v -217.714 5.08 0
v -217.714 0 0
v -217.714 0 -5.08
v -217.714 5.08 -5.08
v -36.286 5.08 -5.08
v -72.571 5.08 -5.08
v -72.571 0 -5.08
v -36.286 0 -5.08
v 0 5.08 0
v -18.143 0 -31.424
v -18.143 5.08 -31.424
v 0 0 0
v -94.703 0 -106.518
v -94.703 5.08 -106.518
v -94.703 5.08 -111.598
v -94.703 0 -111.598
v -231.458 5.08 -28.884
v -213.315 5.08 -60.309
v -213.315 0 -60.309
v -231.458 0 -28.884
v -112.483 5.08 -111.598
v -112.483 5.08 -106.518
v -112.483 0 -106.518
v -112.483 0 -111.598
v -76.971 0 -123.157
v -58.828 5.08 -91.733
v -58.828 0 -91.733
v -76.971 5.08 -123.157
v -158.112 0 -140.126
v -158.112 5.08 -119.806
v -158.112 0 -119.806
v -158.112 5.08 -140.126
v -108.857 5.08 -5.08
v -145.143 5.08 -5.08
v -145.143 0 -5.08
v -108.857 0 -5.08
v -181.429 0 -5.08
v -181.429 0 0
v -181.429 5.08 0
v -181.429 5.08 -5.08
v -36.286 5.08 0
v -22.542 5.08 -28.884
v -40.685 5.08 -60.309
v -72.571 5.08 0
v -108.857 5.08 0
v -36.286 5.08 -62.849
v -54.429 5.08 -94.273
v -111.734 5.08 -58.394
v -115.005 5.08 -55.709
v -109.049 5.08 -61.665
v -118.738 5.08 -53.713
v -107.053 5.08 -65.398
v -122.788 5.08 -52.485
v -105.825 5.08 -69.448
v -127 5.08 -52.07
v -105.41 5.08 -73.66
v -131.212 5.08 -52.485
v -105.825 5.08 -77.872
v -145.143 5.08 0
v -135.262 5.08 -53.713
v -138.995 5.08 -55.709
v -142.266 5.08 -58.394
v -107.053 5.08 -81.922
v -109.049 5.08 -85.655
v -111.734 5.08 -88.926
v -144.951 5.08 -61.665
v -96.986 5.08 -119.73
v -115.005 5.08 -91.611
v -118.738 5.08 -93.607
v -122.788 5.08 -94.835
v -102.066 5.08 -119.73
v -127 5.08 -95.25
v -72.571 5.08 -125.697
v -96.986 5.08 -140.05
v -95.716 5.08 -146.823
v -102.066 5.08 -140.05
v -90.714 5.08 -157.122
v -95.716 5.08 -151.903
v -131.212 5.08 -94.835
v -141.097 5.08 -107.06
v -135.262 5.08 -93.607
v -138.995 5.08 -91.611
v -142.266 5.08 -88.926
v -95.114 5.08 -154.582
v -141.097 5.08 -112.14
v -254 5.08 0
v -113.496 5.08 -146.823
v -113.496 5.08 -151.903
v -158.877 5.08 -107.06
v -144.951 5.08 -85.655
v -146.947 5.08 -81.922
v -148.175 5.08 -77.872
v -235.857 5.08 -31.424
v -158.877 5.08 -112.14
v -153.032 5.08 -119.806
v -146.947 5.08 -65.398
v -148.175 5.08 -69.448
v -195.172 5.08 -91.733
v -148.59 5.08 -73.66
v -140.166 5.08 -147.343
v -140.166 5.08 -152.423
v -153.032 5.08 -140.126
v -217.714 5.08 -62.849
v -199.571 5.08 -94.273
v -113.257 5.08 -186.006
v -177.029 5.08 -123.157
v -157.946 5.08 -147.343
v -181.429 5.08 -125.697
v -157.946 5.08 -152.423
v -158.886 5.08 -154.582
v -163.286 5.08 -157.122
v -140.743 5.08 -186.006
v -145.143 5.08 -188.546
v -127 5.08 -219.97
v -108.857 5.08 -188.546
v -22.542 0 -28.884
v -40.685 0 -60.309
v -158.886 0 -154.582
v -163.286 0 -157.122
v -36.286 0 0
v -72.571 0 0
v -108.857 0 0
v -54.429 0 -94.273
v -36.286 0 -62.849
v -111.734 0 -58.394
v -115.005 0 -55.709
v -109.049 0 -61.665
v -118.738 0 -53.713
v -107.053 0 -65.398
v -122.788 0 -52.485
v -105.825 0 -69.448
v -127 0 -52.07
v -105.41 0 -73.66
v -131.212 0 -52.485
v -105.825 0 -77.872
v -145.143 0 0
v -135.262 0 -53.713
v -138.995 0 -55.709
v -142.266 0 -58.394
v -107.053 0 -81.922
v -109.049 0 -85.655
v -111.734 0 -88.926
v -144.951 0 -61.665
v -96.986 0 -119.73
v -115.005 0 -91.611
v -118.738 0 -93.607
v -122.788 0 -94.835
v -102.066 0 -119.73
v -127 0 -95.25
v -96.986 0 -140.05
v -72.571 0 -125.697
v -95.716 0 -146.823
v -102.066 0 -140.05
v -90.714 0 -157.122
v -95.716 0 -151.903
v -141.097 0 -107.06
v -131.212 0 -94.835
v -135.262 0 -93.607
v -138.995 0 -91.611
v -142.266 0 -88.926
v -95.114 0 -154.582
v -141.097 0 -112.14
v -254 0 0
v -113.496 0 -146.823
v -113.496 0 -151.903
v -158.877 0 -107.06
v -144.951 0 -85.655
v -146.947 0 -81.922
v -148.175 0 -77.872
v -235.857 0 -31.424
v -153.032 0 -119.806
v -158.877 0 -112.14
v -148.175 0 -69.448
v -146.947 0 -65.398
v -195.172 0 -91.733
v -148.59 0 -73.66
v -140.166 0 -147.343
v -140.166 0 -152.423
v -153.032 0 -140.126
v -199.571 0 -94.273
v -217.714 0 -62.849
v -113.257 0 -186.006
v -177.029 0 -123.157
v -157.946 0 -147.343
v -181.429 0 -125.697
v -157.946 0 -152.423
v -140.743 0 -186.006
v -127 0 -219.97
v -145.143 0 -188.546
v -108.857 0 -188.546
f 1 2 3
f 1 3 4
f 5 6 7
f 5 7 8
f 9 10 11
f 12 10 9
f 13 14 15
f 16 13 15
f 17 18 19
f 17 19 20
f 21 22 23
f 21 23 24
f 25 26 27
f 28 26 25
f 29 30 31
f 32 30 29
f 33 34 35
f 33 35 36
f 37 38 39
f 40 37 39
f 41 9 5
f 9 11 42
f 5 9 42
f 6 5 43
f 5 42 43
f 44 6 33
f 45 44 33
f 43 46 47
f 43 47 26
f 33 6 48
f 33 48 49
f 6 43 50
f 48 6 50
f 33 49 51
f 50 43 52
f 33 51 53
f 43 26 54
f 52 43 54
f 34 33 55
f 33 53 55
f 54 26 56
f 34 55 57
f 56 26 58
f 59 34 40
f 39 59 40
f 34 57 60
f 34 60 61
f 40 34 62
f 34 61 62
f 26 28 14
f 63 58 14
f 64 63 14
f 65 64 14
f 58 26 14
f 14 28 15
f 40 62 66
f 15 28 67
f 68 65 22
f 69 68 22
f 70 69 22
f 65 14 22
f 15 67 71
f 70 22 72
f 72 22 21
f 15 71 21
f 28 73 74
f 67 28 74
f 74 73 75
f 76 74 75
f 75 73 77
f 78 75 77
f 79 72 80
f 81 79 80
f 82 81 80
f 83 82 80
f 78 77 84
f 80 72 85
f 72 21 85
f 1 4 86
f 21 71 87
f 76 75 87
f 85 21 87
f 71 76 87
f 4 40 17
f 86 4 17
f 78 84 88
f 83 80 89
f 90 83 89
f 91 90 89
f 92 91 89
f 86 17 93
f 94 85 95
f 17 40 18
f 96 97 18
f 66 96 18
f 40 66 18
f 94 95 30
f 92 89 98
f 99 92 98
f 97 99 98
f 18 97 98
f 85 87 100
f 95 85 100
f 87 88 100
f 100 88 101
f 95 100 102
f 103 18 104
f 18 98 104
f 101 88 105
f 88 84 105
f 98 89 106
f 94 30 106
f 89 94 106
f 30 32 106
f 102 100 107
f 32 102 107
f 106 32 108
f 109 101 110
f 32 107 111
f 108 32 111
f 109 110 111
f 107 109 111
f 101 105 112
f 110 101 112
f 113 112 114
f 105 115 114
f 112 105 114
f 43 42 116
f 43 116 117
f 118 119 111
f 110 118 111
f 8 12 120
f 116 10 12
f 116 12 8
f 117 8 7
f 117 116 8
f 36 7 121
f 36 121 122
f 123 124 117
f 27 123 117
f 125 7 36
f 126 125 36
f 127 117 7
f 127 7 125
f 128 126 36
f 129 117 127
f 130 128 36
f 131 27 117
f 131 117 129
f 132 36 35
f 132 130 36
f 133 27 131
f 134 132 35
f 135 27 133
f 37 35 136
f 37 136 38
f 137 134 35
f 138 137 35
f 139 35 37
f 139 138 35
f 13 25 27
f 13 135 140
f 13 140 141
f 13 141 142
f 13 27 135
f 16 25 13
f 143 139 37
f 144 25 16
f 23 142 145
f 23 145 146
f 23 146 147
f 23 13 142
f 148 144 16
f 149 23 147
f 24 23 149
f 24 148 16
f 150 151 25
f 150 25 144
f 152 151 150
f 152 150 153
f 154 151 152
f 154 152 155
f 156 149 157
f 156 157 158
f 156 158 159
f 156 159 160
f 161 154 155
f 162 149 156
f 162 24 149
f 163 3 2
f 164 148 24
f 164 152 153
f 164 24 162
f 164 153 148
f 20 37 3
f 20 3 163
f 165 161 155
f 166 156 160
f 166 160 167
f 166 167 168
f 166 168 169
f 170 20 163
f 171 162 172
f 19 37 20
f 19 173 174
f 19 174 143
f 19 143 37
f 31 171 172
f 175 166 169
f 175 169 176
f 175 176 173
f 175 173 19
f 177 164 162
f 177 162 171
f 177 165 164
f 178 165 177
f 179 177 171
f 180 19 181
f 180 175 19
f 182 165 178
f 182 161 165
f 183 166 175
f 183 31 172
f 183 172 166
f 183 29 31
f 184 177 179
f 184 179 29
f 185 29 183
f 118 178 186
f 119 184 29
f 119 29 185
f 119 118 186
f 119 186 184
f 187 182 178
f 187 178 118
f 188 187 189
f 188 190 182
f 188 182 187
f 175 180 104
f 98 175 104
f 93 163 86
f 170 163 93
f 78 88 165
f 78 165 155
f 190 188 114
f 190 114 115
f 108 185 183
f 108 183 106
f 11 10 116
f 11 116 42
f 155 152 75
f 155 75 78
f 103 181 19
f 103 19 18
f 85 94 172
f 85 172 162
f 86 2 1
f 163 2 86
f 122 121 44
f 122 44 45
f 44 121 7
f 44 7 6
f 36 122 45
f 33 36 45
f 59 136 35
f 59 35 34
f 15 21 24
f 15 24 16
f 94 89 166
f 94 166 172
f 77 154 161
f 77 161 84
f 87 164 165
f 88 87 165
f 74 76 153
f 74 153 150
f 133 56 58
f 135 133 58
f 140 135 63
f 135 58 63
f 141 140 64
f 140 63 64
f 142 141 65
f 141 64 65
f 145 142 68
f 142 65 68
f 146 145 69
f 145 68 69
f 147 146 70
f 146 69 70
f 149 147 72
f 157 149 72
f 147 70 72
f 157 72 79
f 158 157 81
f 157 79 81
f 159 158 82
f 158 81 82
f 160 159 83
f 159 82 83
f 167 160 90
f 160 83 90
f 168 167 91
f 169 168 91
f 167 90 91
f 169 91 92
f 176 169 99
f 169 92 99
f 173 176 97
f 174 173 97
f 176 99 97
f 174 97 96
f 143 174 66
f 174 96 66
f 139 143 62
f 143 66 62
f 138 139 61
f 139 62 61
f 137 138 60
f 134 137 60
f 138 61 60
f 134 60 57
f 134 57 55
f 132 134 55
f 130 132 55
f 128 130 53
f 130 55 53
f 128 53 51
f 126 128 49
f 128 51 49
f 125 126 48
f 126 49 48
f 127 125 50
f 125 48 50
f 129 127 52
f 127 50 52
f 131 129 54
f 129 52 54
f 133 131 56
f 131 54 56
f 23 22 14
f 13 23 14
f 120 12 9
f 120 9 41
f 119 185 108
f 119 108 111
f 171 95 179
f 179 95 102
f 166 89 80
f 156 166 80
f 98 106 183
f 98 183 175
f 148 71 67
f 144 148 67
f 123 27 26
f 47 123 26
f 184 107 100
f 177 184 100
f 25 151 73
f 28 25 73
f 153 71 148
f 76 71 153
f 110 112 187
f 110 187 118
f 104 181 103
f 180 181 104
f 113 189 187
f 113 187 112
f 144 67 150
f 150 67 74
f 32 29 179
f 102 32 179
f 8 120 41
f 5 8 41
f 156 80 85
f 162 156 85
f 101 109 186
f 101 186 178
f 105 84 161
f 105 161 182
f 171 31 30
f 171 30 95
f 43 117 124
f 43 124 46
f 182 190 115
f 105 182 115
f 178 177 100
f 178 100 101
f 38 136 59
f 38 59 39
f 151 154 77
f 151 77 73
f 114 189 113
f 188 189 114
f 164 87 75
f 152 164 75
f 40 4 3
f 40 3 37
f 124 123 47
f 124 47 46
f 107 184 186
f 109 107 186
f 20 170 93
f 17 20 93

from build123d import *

# Parameters (mm, degrees)
BOSS_EXTRUDE1_DEPTH = 5.08
SKETCH2_W           = 36.285714285
SKETCH2_H           = 5.08
SKETCH2_W_2         = 36.285714286
CUT_EXTRUDE1_DEPTH  = 5.08
SKETCH3_W           = 36.285714285
SKETCH3_H           = 5.08
SKETCH3_W_2         = 36.285714286
CUT_EXTRUDE2_DEPTH  = 5.08
SKETCH4_W           = 36.285714285
SKETCH4_H           = 5.08
SKETCH4_W_2         = 36.285714286
CUT_EXTRUDE3_DEPTH  = 5.08
SKETCH5_R           = 21.59
CUT_EXTRUDE4_DEPTH  = 5.08
SKETCH6_W           = 17.78
SKETCH6_H           = 5.08
SKETCH6_W_2         = 5.08
SKETCH6_H_2         = 20.32
CUT_EXTRUDE5_DEPTH  = 11.16


with BuildPart() as part:
    # Sketch1 → Boss-Extrude1 (new body)
    with BuildSketch(Plane(origin=(0, 0, 0), x_dir=(1, 0, 0), z_dir=(0, 1, 0))):
        Polygon((0, 0), (-254, 0), (-127, 219.970452561), align=None)
    extrude(amount=BOSS_EXTRUDE1_DEPTH)

    # Sketch2 → Cut-Extrude1 (cut)
    with BuildSketch(Plane(origin=(0, 0, 0), x_dir=(-0.5, 0, -0.866025404), z_dir=(0.866025404, 0, -0.5))):
        with Locations((199.571428572, 2.54)):
            Rectangle(SKETCH2_W, SKETCH2_H)
        with Locations((127, 2.54)):
            Rectangle(SKETCH2_W_2, SKETCH2_H)
        with Locations((54.428571428, 2.54)):
            Rectangle(SKETCH2_W, SKETCH2_H)
    extrude(amount=-CUT_EXTRUDE1_DEPTH, mode=Mode.SUBTRACT)

    # Sketch3 → Cut-Extrude2 (cut)
    with BuildSketch(Plane(origin=(-190.5, 0, -109.985226281), x_dir=(-0.5, 0, 0.866025404), z_dir=(-0.866025404, 0, -0.5))):
        with Locations((-72.571428572, 2.54)):
            Rectangle(SKETCH3_W, SKETCH3_H)
        with Locations((0, 2.54)):
            Rectangle(SKETCH3_W_2, SKETCH3_H)
        with Locations((72.571428572, 2.54)):
            Rectangle(SKETCH3_W, SKETCH3_H)
    extrude(amount=-CUT_EXTRUDE2_DEPTH, mode=Mode.SUBTRACT)

    # Sketch4 → Cut-Extrude3 (cut)
    with BuildSketch(Plane.XY):
        with Locations((-199.571428572, 2.54)):
            Rectangle(SKETCH4_W, SKETCH4_H)
        with Locations((-127, 2.54)):
            Rectangle(SKETCH4_W_2, SKETCH4_H)
        with Locations((-54.428571428, 2.54)):
            Rectangle(SKETCH4_W, SKETCH4_H)
    extrude(amount=-CUT_EXTRUDE3_DEPTH, mode=Mode.SUBTRACT)

    # Sketch5 → Cut-Extrude4 (cut)
    with BuildSketch(Plane(origin=(0, 5.08, 0), x_dir=(1, 0, 0), z_dir=(0, 1, 0))):
        with Locations((-127, 73.66)):
            Circle(SKETCH5_R)
    extrude(amount=-CUT_EXTRUDE4_DEPTH, mode=Mode.SUBTRACT)

    # Sketch6 → Cut-Extrude5 (cut, through all)
    with BuildSketch(Plane(origin=(0, 10.16, 0), x_dir=(1, 0, 0), z_dir=(0, 1, 0))):
        with Locations((-149.055874493, 149.882969593)):
            Rectangle(SKETCH6_W, SKETCH6_H)
        with Locations((-104.605874493, 149.36329839)):
            Rectangle(SKETCH6_W, SKETCH6_H)
        with Locations((-99.525874493, 129.889965056)):
            Rectangle(SKETCH6_W_2, SKETCH6_H_2)
        with Locations((-103.592773819, 109.0579774)):
            Rectangle(SKETCH6_W, SKETCH6_H)
        with Locations((-149.987461319, 109.600384218)):
            Rectangle(SKETCH6_W, SKETCH6_H)
        with Locations((-155.572009554, 129.965942855)):
            Rectangle(SKETCH6_W_2, SKETCH6_H_2)
    extrude(amount=-CUT_EXTRUDE5_DEPTH, mode=Mode.SUBTRACT)


solid = part.part
